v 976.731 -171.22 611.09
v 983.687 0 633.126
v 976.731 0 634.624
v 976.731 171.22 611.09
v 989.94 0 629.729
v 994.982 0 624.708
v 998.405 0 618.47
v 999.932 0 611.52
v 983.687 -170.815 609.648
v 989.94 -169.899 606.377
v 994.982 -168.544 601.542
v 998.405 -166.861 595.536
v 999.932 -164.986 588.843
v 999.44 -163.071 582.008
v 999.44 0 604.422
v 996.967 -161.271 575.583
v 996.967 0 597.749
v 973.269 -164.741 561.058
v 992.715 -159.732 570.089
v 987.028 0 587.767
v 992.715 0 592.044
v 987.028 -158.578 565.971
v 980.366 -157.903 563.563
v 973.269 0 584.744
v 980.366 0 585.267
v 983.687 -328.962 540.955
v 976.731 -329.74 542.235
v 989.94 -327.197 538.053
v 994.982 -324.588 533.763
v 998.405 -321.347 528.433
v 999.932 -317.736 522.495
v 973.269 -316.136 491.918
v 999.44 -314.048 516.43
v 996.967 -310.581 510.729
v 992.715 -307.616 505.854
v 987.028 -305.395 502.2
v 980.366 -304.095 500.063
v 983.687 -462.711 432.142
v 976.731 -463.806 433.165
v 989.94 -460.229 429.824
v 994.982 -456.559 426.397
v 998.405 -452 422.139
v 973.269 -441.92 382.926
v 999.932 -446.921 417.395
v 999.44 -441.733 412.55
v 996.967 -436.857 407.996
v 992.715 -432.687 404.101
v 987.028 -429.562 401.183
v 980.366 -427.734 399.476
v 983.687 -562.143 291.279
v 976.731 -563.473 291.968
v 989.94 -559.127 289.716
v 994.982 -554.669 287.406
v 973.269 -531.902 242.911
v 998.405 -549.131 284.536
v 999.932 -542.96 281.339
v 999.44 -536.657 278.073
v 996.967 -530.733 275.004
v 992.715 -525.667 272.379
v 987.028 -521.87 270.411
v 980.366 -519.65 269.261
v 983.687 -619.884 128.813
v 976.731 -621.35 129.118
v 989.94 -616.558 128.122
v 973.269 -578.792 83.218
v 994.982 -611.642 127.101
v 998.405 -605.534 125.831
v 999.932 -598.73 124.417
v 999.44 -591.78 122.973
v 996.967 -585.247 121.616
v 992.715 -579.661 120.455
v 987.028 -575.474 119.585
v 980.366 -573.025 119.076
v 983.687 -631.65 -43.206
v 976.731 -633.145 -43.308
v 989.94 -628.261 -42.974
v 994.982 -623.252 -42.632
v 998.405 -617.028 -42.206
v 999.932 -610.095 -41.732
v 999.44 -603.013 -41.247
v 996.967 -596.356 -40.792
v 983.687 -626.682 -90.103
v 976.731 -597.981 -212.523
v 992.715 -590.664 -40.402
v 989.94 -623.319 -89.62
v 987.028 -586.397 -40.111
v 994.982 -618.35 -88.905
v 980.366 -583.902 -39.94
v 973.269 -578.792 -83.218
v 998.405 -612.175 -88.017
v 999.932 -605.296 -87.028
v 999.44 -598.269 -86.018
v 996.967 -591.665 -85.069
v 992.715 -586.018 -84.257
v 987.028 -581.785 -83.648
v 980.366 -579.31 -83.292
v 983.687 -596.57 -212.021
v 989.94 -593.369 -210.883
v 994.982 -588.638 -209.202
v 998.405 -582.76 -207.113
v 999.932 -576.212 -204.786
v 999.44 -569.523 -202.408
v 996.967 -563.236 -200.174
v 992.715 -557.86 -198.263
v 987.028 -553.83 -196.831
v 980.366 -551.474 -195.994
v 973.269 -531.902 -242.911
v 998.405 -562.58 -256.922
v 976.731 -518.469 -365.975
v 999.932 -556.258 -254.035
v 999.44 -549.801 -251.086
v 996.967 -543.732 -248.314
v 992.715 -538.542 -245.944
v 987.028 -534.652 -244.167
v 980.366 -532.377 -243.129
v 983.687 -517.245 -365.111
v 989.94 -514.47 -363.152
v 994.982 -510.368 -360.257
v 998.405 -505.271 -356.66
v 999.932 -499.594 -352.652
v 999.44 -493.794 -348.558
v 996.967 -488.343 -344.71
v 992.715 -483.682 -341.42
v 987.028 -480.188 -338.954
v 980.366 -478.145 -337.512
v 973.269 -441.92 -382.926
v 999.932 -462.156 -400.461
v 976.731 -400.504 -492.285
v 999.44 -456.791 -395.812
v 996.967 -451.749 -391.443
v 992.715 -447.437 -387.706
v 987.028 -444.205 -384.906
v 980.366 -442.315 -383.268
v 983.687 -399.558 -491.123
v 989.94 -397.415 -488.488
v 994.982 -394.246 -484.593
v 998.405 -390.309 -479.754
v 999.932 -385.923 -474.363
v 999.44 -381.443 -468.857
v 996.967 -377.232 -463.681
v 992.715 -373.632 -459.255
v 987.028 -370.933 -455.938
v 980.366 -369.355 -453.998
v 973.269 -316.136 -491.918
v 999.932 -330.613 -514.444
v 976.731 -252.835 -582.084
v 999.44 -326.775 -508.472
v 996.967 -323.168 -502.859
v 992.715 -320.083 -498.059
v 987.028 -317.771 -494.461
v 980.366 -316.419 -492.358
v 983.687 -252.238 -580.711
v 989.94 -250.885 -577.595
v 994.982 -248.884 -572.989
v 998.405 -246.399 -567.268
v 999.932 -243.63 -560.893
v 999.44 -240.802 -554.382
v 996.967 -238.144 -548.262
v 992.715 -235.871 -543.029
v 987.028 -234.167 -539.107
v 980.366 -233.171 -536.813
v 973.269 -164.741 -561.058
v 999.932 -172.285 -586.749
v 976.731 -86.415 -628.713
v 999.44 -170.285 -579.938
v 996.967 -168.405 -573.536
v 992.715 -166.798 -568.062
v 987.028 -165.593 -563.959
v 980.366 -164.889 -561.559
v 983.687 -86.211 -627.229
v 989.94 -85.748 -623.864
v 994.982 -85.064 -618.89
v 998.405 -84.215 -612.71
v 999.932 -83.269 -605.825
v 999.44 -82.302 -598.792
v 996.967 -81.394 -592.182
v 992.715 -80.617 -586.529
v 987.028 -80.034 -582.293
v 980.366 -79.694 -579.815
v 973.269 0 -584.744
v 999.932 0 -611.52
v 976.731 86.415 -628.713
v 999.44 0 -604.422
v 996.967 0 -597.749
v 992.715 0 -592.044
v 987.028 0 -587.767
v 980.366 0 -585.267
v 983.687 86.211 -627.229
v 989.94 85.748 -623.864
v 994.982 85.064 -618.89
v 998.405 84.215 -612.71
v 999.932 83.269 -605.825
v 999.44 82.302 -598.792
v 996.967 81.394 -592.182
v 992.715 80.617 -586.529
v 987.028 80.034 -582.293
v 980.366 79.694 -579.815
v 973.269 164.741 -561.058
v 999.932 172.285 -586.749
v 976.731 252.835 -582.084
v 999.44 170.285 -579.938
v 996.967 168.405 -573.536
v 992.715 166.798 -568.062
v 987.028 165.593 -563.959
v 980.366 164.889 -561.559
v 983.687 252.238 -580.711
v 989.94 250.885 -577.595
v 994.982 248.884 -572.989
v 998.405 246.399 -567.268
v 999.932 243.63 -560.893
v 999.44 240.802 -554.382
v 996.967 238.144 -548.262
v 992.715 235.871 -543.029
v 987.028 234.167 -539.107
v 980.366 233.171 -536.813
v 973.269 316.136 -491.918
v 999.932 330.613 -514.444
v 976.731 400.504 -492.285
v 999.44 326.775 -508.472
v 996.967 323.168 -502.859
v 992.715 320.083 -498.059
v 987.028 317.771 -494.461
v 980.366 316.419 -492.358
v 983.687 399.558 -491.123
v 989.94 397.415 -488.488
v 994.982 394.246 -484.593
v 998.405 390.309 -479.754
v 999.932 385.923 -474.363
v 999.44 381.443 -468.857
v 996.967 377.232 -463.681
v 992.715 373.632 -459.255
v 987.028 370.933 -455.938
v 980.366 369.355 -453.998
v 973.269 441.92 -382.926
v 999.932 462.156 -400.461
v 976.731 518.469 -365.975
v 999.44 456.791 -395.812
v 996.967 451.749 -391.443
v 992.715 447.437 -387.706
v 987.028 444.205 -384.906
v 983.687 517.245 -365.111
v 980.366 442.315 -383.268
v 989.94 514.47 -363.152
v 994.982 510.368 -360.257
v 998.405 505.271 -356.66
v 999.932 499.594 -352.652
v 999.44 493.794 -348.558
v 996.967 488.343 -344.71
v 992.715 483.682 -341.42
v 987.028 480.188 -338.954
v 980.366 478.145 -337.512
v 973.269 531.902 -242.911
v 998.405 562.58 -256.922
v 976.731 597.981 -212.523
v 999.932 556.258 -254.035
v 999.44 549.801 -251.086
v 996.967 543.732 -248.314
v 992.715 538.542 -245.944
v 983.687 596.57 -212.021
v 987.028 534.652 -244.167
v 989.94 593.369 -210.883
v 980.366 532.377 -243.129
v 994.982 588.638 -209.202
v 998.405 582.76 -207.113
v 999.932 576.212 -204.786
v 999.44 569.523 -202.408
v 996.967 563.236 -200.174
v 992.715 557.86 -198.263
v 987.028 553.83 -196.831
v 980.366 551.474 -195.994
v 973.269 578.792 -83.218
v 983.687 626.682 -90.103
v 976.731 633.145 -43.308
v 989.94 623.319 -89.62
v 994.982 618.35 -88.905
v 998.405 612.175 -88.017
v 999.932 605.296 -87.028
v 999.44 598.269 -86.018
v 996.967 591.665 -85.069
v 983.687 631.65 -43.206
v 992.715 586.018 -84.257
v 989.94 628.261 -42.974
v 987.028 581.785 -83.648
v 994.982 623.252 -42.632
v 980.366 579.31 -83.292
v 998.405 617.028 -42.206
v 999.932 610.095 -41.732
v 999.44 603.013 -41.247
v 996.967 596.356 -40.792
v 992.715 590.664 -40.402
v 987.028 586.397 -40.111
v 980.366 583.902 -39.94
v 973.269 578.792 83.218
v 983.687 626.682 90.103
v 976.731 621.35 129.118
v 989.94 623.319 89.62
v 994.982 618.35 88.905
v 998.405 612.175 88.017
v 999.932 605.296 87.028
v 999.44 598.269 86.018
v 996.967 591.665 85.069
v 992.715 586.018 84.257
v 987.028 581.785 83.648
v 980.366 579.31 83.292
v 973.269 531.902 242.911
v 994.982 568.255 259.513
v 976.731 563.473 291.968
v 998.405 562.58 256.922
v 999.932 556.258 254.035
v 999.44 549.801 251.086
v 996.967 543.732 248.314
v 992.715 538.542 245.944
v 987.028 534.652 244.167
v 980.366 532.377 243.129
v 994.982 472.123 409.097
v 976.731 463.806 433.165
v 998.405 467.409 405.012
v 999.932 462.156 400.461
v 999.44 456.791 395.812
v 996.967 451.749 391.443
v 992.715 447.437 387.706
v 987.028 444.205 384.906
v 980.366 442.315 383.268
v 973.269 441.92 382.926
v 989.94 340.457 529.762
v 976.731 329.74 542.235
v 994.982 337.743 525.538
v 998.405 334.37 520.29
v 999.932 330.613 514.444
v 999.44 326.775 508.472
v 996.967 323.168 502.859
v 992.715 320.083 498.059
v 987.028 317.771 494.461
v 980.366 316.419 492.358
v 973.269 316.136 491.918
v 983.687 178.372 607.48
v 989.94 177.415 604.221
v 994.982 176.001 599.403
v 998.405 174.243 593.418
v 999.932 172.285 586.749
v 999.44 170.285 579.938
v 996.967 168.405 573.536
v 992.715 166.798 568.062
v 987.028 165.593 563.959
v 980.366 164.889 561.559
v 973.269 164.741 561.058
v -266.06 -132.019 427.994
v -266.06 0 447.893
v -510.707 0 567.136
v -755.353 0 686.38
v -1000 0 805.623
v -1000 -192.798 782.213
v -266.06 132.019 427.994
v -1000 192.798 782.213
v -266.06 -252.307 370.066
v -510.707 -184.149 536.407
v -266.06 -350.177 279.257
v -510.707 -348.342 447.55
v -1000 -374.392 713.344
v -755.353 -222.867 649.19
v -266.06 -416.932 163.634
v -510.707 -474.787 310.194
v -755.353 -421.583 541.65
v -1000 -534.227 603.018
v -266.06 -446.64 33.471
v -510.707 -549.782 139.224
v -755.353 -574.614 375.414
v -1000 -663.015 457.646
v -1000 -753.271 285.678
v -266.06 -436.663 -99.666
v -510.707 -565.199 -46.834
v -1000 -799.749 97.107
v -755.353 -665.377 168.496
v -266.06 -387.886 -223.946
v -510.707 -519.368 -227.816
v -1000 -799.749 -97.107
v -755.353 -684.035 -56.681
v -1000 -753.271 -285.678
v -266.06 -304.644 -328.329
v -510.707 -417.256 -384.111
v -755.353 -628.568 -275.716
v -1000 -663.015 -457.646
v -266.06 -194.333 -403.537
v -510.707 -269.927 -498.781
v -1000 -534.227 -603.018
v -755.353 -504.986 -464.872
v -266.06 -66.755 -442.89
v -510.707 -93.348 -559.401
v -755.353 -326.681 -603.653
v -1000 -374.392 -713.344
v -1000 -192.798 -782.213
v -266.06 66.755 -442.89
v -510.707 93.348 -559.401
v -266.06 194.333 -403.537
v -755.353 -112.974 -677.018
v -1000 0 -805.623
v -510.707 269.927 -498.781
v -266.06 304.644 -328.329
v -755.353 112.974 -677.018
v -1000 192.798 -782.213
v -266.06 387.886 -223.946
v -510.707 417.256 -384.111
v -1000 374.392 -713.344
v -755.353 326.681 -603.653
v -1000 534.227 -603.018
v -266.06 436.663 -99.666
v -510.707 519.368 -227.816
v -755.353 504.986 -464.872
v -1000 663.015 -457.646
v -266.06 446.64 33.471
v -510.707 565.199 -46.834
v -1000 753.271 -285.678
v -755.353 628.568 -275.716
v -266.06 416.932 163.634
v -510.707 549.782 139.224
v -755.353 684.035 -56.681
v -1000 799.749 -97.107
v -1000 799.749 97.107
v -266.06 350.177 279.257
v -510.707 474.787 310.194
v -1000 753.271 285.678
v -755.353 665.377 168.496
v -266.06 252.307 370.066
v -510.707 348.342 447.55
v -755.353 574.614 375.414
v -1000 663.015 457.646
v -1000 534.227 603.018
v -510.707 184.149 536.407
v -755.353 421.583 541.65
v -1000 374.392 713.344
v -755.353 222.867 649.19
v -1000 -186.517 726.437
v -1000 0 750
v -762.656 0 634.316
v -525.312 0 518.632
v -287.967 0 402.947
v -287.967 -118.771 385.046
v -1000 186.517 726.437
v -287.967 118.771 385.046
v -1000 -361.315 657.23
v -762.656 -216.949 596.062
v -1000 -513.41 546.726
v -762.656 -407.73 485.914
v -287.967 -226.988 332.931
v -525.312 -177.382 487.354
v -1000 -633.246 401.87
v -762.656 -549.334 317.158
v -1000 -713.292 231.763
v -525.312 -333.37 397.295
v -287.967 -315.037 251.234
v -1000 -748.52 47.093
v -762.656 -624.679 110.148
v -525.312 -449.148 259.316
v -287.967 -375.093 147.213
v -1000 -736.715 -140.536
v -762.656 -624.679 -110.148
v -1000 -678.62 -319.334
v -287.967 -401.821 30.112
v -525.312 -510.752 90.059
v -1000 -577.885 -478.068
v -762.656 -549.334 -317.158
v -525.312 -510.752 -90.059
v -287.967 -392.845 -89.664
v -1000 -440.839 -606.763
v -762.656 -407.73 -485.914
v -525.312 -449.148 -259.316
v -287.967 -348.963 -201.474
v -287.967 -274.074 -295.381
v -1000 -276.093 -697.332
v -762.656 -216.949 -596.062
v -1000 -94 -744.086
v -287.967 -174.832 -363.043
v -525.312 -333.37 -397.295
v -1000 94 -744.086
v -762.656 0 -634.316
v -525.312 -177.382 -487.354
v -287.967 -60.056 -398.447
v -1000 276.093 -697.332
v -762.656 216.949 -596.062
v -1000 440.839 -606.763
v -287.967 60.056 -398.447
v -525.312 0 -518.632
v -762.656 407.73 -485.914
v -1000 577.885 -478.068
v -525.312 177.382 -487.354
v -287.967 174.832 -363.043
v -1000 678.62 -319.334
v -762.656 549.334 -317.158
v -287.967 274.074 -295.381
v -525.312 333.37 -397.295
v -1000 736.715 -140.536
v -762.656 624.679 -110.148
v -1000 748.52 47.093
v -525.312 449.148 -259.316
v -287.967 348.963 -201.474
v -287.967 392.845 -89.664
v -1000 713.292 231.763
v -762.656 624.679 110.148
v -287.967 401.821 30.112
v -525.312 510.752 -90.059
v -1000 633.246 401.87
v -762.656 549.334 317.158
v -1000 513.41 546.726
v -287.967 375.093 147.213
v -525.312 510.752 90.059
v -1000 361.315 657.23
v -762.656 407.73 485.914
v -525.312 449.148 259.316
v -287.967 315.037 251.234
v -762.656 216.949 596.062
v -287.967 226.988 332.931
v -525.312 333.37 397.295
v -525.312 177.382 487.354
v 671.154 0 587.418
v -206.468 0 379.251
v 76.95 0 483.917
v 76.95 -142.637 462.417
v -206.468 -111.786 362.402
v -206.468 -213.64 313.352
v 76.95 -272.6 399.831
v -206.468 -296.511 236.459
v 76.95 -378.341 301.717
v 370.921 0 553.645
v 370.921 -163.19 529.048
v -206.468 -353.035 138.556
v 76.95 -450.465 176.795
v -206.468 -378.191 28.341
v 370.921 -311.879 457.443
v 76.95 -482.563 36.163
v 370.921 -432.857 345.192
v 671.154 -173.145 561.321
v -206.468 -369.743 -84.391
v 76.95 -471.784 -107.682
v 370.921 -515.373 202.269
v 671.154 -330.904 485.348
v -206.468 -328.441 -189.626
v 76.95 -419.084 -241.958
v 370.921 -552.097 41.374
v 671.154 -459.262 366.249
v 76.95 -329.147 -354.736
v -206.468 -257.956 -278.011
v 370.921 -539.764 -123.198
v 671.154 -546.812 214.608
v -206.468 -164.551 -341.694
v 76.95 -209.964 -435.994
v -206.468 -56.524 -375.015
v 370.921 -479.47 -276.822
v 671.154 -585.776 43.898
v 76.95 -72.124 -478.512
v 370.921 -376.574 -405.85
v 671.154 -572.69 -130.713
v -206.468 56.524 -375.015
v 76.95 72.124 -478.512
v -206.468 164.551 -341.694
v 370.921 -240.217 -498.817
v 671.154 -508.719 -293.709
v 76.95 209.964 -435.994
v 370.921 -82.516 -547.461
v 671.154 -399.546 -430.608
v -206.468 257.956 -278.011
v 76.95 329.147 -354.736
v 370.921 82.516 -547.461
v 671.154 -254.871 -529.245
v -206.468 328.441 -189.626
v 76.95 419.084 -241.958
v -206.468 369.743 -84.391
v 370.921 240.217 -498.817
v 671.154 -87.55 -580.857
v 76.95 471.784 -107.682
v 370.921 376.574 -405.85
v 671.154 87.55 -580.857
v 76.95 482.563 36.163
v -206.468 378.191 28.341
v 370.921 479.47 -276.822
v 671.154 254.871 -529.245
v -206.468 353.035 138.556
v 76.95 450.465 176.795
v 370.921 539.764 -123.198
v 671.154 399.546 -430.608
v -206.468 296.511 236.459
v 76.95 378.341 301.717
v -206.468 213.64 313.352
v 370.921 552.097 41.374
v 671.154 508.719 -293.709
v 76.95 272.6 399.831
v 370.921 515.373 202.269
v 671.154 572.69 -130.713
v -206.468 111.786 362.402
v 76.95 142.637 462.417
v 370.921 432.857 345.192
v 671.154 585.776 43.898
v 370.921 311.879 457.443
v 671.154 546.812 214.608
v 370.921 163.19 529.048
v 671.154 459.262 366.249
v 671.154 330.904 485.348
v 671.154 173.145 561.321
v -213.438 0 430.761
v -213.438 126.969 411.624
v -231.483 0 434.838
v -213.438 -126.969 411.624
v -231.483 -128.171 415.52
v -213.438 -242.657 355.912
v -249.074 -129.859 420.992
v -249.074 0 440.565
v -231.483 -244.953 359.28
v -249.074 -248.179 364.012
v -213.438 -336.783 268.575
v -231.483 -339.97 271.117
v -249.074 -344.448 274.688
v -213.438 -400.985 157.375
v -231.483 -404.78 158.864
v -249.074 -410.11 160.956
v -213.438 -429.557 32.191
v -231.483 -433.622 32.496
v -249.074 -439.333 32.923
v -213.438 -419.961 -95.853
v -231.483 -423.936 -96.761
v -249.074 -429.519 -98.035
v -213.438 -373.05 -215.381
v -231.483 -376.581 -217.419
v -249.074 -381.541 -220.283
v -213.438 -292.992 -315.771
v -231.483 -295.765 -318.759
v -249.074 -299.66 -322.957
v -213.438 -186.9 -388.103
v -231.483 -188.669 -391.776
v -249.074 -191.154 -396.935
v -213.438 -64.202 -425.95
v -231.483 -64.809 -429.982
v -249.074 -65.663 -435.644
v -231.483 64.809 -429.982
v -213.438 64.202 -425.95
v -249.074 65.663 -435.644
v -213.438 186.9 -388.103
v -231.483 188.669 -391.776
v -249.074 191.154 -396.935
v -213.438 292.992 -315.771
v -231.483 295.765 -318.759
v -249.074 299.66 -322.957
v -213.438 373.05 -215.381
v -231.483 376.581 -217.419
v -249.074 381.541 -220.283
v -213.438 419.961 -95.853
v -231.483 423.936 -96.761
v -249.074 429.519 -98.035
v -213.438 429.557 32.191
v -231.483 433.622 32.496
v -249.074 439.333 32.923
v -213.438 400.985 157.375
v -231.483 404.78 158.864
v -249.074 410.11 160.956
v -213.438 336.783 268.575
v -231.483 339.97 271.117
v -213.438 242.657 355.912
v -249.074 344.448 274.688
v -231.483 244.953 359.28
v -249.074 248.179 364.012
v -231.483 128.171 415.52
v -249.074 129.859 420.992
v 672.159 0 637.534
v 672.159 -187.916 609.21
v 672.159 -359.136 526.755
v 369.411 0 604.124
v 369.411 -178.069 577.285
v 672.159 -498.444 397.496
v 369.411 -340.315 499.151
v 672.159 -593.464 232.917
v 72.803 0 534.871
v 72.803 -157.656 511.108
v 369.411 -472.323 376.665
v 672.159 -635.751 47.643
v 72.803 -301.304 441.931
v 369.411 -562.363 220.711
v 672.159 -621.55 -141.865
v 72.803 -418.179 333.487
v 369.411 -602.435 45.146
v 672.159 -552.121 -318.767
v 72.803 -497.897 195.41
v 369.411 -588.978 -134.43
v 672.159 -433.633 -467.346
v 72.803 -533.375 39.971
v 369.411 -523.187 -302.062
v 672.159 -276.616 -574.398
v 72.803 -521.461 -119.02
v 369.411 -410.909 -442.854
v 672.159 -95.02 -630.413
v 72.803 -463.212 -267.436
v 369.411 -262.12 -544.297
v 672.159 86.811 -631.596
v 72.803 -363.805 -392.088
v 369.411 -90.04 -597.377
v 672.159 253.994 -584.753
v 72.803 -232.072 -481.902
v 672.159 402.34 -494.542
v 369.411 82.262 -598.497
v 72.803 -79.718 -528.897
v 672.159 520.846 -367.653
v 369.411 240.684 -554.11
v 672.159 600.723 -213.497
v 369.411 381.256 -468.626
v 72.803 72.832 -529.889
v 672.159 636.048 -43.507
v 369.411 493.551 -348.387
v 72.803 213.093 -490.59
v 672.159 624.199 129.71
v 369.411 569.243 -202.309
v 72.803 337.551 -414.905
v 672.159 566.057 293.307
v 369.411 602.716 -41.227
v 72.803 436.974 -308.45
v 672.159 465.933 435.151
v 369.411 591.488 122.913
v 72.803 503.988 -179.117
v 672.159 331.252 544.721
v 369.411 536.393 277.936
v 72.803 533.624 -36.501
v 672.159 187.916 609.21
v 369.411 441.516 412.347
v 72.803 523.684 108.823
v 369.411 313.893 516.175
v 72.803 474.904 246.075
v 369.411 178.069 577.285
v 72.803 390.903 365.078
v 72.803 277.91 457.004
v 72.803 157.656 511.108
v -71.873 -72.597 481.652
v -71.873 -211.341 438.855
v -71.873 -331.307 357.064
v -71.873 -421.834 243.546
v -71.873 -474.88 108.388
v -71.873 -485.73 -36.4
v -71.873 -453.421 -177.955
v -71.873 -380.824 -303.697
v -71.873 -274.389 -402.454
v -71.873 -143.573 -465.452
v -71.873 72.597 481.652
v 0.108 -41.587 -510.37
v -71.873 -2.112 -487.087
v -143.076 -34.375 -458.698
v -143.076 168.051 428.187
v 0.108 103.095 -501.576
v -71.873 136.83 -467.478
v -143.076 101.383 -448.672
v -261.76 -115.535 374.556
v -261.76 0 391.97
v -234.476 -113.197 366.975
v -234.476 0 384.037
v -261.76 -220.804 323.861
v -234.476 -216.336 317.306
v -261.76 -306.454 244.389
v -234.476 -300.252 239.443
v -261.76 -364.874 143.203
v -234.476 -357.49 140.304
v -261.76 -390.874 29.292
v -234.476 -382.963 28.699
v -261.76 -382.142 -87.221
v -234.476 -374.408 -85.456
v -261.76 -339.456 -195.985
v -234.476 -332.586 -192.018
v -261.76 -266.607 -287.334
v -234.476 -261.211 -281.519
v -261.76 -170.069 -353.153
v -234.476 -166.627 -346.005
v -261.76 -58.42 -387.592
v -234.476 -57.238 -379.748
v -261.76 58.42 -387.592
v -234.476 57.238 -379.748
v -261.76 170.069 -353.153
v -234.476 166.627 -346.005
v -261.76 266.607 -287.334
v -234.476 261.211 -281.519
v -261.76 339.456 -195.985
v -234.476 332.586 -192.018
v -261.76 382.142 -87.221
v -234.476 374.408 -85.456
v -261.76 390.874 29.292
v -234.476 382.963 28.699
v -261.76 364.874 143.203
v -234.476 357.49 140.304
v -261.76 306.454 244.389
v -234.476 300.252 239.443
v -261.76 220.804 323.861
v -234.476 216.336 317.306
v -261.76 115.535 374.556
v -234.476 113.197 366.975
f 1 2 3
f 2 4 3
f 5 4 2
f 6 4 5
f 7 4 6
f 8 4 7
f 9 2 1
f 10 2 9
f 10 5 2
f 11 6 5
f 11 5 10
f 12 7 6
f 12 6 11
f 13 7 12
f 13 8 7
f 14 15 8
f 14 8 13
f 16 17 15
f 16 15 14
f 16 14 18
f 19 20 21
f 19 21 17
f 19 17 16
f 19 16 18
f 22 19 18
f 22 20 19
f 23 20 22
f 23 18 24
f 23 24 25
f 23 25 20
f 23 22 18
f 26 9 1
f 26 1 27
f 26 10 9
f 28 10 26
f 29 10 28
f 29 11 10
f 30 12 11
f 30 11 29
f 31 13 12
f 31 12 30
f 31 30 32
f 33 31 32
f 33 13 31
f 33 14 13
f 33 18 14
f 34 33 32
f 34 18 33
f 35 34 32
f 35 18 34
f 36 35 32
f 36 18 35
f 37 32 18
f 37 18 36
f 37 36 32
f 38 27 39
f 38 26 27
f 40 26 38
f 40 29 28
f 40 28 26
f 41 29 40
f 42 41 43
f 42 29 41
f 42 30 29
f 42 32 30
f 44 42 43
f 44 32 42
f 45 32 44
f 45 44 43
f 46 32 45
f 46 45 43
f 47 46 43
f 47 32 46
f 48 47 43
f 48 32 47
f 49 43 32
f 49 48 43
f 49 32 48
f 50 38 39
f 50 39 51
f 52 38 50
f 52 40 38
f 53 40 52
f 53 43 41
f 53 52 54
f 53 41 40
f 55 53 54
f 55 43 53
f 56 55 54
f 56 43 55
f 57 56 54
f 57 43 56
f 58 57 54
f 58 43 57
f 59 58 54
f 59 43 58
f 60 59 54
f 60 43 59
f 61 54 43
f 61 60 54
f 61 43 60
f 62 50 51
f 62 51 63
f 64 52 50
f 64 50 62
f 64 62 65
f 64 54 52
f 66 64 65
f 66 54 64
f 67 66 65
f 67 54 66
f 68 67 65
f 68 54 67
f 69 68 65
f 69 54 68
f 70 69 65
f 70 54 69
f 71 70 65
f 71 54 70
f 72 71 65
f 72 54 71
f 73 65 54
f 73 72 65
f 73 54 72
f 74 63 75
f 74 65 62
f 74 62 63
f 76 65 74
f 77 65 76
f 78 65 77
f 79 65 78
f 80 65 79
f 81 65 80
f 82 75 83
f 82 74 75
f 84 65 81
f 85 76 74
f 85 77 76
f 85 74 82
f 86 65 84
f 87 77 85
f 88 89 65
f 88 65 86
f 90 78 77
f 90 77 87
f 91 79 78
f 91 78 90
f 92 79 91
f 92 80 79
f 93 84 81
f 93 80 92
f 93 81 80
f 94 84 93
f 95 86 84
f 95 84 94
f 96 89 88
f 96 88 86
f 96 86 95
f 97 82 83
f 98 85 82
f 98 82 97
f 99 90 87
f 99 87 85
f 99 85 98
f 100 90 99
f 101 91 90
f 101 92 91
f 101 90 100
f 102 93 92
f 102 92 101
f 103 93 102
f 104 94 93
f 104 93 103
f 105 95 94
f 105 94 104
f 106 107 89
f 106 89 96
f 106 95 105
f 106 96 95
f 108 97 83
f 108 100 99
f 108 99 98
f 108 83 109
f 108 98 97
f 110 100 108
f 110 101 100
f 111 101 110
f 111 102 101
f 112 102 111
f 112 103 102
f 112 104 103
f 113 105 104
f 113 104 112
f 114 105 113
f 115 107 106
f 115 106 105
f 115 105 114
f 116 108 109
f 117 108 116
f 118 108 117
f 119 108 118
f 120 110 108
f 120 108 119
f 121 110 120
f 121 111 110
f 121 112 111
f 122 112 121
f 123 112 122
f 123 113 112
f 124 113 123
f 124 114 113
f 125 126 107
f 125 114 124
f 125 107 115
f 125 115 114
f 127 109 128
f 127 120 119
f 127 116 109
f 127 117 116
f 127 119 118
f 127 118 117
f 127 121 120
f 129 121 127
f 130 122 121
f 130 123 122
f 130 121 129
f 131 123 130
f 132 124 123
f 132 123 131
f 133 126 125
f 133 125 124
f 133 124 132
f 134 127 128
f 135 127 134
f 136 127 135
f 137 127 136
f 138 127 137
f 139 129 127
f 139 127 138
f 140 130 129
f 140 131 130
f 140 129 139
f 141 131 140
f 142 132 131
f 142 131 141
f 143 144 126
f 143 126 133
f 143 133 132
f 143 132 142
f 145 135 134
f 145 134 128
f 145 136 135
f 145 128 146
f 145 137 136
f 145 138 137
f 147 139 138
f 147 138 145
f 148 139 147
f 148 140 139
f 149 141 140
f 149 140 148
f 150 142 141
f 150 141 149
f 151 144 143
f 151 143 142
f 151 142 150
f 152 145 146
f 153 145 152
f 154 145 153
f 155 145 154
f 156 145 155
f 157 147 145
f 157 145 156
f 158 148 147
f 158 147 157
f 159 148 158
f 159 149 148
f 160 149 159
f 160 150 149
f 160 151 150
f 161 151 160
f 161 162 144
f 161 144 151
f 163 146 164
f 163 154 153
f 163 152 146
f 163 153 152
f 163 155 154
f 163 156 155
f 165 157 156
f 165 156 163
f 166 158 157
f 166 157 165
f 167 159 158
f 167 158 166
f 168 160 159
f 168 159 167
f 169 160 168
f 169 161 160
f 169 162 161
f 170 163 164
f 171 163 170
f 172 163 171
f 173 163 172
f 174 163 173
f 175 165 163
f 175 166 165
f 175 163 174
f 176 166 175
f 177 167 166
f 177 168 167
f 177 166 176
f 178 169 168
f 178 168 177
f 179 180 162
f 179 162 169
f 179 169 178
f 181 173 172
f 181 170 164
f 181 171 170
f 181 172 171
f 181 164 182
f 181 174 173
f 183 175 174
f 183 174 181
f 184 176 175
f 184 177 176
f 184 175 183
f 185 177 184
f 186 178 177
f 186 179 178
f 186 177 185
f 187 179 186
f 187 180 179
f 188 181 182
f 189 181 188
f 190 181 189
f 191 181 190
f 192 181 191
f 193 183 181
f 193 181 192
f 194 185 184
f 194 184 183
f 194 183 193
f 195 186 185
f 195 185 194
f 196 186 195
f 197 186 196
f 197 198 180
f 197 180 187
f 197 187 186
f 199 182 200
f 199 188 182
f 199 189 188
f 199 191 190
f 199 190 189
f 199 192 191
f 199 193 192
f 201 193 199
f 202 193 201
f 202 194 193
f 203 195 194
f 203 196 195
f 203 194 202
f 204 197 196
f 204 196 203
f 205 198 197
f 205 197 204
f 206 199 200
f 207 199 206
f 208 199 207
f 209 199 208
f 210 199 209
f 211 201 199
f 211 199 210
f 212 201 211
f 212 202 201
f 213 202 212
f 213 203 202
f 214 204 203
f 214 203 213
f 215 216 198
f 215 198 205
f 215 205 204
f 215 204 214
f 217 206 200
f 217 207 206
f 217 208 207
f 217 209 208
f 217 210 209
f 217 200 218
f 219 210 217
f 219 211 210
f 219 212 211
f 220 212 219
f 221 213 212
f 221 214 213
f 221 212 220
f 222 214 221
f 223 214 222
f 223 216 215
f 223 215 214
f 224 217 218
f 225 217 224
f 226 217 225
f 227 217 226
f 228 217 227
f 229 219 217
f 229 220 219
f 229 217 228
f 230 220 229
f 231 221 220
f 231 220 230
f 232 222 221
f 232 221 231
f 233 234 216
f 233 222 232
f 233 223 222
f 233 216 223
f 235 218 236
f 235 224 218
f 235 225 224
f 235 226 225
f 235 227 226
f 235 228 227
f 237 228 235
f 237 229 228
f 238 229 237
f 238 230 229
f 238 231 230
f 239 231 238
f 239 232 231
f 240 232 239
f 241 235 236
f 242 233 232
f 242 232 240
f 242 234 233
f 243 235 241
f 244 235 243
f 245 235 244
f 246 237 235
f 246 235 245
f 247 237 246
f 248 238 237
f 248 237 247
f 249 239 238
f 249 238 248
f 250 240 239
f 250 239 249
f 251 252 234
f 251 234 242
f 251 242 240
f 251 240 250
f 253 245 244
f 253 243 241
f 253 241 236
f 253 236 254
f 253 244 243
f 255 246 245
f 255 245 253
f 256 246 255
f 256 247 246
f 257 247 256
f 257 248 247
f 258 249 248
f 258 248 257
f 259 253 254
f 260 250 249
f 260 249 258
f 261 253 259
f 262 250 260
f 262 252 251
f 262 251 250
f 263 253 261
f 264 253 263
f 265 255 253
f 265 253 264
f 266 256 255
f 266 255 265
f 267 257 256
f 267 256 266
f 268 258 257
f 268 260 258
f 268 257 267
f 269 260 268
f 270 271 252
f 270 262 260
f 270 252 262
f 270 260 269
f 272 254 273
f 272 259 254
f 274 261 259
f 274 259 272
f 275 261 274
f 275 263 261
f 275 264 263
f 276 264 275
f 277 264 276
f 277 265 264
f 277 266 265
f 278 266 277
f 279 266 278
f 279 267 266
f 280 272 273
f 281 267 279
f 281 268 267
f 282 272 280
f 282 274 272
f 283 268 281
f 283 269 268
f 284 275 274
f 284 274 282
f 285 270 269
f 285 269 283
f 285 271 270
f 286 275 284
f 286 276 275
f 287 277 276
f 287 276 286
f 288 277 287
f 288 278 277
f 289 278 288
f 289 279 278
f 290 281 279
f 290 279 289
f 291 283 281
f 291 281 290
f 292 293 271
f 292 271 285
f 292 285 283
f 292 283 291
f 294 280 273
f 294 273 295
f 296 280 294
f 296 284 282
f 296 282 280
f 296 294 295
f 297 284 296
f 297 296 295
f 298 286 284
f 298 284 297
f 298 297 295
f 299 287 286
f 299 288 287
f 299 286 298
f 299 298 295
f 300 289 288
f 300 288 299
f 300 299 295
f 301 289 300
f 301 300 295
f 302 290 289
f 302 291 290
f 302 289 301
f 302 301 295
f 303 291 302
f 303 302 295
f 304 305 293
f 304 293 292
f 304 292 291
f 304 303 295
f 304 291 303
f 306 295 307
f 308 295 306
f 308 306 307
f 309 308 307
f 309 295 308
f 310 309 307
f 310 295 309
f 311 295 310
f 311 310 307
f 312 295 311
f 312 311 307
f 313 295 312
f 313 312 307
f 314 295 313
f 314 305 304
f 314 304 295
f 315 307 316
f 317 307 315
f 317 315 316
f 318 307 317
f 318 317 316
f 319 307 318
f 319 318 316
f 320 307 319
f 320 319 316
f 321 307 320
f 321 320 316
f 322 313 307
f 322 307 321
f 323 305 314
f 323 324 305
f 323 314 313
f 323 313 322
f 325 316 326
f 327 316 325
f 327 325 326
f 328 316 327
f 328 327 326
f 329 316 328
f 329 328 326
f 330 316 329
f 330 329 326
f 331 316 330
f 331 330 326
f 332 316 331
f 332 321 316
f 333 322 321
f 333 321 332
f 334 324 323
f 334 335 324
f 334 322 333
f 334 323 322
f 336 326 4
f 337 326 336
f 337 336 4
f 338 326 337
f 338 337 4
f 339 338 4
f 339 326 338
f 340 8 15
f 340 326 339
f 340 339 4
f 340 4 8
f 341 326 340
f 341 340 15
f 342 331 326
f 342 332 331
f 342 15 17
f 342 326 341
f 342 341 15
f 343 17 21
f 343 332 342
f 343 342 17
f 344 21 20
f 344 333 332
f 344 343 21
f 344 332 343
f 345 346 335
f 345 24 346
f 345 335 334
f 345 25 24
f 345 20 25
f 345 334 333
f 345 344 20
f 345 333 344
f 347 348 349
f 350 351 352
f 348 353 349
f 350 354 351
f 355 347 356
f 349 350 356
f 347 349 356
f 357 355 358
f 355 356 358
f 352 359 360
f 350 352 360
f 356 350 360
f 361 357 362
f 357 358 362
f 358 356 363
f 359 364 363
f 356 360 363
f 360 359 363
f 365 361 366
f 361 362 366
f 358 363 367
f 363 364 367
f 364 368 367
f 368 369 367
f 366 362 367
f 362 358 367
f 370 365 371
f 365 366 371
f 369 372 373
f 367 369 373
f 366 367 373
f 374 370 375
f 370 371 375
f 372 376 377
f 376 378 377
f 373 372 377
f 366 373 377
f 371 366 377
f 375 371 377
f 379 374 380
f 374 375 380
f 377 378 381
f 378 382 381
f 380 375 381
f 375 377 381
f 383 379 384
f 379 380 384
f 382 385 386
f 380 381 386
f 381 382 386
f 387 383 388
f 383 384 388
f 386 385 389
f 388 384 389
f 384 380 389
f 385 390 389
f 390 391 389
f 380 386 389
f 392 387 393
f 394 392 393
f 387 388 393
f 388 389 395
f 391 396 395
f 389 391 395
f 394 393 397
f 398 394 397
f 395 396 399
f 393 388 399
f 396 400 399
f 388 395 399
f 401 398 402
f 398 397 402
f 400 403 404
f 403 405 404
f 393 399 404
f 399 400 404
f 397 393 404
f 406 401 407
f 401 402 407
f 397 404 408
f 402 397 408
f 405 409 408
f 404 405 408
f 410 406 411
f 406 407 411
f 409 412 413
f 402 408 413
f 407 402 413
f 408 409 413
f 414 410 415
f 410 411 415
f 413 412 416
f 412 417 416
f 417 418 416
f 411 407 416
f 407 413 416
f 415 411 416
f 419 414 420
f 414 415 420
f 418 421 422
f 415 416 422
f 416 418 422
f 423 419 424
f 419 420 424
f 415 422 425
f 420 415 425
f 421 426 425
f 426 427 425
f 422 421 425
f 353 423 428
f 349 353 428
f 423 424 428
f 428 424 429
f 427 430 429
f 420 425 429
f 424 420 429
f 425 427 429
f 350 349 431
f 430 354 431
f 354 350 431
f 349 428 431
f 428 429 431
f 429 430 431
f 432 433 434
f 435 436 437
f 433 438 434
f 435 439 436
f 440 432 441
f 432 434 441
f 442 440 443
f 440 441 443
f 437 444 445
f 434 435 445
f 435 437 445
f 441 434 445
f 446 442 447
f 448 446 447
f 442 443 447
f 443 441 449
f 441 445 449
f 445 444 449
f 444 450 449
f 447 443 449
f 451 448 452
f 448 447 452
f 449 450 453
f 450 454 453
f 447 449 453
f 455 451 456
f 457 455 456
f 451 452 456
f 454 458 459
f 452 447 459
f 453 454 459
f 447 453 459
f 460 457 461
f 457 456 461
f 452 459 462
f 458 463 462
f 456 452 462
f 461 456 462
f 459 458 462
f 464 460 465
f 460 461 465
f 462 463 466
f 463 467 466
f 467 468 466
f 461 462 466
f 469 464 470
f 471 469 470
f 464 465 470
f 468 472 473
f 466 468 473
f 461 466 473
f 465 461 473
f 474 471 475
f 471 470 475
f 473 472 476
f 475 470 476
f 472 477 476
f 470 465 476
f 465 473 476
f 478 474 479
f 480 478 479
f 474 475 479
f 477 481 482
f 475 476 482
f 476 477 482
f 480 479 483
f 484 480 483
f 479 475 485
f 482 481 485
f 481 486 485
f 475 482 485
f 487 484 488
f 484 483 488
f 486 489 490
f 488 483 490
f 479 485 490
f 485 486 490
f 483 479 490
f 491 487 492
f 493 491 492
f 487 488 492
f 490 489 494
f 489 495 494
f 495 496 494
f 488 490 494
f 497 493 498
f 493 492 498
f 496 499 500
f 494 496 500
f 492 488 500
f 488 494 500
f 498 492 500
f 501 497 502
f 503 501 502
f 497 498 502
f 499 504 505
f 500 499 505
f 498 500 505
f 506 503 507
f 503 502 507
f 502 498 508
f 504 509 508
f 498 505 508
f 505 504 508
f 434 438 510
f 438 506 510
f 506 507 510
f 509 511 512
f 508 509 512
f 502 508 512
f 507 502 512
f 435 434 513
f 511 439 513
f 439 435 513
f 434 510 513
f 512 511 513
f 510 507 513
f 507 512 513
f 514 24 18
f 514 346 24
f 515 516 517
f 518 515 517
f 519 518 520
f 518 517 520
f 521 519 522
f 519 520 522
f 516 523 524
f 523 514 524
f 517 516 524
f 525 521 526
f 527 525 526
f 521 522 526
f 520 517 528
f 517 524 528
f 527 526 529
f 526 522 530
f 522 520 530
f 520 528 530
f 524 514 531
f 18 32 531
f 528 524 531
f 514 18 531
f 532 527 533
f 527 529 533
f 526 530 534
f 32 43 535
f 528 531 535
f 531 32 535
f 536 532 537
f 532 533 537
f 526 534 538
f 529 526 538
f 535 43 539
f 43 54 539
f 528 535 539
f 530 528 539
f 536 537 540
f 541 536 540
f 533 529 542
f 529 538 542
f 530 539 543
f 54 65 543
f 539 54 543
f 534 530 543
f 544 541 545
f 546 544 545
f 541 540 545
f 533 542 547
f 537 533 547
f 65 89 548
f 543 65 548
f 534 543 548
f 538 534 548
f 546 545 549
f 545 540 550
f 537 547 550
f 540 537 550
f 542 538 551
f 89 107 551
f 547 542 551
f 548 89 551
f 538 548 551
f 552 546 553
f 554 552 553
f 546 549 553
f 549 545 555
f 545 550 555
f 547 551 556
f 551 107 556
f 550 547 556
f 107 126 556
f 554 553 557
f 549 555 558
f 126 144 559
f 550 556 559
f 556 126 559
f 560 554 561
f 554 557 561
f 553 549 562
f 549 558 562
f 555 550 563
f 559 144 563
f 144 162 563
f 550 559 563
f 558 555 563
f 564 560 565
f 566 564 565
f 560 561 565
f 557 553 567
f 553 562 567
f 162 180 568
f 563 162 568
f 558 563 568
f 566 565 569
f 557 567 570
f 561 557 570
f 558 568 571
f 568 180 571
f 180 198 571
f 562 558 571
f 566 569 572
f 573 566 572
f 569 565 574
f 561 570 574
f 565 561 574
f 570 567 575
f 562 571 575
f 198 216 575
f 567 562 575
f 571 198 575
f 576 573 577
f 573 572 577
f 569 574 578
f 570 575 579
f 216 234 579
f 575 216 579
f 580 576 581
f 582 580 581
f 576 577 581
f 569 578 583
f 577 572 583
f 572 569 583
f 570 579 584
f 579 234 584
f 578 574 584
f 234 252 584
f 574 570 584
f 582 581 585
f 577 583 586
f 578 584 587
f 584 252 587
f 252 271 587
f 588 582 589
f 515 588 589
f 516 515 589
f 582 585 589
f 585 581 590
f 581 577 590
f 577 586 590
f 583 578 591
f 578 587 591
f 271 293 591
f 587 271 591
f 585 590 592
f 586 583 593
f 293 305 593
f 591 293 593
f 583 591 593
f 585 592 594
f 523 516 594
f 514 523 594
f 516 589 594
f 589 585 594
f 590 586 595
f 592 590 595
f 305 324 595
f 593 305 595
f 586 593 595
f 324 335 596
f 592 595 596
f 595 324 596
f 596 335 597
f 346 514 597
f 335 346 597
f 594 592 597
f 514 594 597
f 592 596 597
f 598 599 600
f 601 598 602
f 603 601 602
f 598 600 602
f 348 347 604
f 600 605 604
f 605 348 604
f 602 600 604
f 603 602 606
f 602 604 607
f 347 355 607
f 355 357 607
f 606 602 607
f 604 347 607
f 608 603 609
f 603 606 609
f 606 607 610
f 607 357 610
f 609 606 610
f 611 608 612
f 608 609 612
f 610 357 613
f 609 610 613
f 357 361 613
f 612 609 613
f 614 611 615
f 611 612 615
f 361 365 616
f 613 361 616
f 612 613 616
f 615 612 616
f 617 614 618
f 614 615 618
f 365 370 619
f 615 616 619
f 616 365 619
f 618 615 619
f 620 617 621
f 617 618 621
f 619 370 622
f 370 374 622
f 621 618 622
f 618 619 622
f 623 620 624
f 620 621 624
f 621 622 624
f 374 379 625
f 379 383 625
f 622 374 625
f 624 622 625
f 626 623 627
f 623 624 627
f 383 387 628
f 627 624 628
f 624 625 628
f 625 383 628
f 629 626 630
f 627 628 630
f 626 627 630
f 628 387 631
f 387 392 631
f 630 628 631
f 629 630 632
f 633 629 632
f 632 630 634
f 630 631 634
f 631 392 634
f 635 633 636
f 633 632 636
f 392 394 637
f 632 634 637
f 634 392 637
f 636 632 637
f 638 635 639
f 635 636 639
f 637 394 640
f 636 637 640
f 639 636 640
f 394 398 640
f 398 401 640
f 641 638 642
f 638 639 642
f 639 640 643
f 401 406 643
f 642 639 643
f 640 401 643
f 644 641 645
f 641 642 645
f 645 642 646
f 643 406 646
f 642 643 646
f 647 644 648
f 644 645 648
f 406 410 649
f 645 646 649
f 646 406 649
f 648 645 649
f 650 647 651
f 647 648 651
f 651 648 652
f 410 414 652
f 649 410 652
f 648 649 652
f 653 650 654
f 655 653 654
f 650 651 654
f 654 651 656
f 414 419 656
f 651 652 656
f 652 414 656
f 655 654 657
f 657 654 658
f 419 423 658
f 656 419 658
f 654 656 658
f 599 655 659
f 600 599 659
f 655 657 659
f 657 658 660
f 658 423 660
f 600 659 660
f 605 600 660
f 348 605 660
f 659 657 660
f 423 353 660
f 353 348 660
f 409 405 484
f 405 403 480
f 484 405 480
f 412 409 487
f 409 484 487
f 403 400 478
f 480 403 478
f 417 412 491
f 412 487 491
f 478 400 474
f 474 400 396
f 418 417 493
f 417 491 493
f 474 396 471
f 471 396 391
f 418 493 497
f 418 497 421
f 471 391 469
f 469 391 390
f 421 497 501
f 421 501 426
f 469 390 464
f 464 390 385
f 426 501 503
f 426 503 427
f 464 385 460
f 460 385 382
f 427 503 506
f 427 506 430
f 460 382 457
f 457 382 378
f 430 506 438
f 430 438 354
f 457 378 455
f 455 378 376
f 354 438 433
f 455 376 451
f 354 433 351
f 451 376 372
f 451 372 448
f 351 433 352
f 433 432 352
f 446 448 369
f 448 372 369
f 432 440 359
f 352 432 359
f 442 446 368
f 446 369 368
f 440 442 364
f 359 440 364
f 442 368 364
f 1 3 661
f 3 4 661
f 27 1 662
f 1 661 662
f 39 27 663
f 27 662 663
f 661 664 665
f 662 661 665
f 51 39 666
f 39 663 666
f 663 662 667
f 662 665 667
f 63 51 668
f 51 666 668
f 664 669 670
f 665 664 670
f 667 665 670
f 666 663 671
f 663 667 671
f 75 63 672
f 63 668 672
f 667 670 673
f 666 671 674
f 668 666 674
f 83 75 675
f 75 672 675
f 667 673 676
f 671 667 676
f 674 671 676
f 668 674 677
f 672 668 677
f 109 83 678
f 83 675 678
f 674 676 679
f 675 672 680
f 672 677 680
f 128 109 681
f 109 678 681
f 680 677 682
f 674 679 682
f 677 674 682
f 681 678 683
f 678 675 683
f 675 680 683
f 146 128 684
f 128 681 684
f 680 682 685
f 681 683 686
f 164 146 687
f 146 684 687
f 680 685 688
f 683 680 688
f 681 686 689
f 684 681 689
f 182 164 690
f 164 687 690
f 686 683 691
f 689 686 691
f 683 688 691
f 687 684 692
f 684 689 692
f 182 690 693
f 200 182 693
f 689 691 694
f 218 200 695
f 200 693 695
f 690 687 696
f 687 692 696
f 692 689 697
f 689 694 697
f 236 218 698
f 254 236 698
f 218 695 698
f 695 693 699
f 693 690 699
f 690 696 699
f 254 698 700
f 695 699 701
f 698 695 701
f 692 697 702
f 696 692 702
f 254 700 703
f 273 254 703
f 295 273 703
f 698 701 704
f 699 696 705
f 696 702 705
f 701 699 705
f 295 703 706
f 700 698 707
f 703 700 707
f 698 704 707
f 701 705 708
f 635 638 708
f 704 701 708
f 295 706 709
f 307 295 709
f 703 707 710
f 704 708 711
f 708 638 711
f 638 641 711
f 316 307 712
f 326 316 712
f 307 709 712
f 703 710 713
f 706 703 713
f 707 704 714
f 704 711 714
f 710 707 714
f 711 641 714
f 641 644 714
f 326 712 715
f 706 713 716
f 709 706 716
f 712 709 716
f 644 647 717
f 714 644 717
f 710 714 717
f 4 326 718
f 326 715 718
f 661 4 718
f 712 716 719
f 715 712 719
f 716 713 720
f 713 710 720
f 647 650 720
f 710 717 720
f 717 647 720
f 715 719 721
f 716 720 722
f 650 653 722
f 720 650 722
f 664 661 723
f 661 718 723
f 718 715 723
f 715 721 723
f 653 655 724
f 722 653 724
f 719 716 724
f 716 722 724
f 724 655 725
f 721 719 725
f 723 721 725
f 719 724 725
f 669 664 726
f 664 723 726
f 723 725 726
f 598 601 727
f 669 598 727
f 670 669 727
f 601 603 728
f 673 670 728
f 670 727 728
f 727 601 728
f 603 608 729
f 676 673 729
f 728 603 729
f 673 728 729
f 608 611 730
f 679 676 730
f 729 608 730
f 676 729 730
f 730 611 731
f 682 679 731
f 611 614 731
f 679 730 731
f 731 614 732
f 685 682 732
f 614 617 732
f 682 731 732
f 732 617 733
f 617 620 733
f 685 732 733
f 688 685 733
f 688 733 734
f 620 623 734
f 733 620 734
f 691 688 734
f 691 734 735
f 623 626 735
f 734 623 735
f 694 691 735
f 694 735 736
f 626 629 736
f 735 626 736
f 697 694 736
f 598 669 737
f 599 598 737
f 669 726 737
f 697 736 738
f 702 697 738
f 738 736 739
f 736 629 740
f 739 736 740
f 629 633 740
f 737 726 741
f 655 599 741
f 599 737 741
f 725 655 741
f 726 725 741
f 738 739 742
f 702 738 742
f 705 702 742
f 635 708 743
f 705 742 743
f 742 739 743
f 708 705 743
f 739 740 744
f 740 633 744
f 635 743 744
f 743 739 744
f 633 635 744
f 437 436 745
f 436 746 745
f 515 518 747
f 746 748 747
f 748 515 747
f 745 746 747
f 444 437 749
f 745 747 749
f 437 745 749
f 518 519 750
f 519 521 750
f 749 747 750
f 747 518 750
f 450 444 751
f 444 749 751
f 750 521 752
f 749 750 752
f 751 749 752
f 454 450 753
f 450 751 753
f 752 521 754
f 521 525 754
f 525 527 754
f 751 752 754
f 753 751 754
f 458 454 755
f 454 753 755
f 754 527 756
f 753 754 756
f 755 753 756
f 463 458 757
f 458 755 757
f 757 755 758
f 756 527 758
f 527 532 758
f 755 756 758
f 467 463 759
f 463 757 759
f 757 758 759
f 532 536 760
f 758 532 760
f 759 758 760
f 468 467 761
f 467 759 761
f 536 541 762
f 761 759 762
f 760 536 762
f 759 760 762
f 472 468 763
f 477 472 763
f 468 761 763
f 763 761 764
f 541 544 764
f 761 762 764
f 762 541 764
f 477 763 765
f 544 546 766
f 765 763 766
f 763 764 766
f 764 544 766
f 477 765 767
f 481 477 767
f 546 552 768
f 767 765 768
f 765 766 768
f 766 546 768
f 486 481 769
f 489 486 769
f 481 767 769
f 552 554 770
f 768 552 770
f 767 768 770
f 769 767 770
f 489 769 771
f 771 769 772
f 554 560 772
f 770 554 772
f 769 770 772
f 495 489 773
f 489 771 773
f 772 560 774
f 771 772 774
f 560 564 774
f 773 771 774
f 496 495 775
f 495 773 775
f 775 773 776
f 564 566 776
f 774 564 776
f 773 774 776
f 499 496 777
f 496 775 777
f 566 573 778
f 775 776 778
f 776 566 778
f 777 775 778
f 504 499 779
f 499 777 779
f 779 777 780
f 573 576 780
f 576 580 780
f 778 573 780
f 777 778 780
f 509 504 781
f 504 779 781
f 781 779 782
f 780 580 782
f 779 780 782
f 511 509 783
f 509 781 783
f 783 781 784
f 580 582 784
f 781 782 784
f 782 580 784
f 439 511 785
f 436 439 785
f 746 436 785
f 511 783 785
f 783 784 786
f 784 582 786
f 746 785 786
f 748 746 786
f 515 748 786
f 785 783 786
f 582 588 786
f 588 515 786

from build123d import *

# Parameters (mm, degrees)
FILLET1_R = 25


with BuildPart() as part:
    # Sketch1 → Revolve1 (revolve)
    with BuildSketch(Plane.XY, mode=Mode.PRIVATE) as revolve1_sk:
        with BuildLine():
            Line((-1000, 750), (-287.96738453, 402.947323104))
            ThreePointArc((-287.96738453, 402.947323104), (-248.23068853, 387.615384192), (-206.46810091, 379.25119654))
            ThreePointArc((-206.46810091, 379.25119654), (384.130769757, 555.909184123), (1000, 582.74501558))
            Line((1000, 582.74501558), (1000, 632.902298406))
            ThreePointArc((1000, 632.902298406), (380.914443639, 606.067618482), (-213.437966267, 430.76148915))
            ThreePointArc((-213.437966267, 430.76148915), (-240.344629809, 437.498198252), (-266.060496719, 447.892715153))
            Line((-266.060496719, 447.892715153), (-1000, 805.62305469))
            Line((-1000, 805.62305469), (-1000, 750))
        make_face()
    revolve(revolve1_sk.sketch.rotate(Axis((-150.527216967, 0, 0), (1, 0, 0)), 90), axis=Axis((-150.527216967, 0, 0), (1, 0, 0)))

    # Fillet1
    # the kernel refuses this fillet: 25 mm, written as the material it takes off along each edge
    with BuildSketch(Plane(origin=(1000, 0, 0), x_dir=(0, 0, 1), z_dir=(0, 1, 0))) as fillet1_piece_1:
        with BuildLine():
            CenterArc((609.684060703, -25), FILLET1_R, 3.96980258, 86.03019742)
            ThreePointArc((634.624077614, -23.269232412), (633.789791115, -11.632647741), (632.902298406, 0))
            Line((632.902298406, 0), (609.684060703, 0))
        make_face()
    revolve(axis=Axis((1000, 0, 0), (1, 0, 0)), mode=Mode.SUBTRACT)
    with BuildSketch(Plane(origin=(1000, 0, 0), x_dir=(0, 0, 1), z_dir=(0, 1, 0))) as fillet1_piece_2:
        with BuildLine():
            CenterArc((609.684060703, -25), FILLET1_R, 90, 93.96980258)
            Line((609.684060703, 0), (582.74501558, 0))
            ThreePointArc((582.74501558, 0), (583.780340457, -13.362705729), (584.744043791, -26.730767588))
        make_face()
    revolve(axis=Axis((1000, 0, 0), (1, 0, 0)), mode=Mode.SUBTRACT)


solid = part.part
